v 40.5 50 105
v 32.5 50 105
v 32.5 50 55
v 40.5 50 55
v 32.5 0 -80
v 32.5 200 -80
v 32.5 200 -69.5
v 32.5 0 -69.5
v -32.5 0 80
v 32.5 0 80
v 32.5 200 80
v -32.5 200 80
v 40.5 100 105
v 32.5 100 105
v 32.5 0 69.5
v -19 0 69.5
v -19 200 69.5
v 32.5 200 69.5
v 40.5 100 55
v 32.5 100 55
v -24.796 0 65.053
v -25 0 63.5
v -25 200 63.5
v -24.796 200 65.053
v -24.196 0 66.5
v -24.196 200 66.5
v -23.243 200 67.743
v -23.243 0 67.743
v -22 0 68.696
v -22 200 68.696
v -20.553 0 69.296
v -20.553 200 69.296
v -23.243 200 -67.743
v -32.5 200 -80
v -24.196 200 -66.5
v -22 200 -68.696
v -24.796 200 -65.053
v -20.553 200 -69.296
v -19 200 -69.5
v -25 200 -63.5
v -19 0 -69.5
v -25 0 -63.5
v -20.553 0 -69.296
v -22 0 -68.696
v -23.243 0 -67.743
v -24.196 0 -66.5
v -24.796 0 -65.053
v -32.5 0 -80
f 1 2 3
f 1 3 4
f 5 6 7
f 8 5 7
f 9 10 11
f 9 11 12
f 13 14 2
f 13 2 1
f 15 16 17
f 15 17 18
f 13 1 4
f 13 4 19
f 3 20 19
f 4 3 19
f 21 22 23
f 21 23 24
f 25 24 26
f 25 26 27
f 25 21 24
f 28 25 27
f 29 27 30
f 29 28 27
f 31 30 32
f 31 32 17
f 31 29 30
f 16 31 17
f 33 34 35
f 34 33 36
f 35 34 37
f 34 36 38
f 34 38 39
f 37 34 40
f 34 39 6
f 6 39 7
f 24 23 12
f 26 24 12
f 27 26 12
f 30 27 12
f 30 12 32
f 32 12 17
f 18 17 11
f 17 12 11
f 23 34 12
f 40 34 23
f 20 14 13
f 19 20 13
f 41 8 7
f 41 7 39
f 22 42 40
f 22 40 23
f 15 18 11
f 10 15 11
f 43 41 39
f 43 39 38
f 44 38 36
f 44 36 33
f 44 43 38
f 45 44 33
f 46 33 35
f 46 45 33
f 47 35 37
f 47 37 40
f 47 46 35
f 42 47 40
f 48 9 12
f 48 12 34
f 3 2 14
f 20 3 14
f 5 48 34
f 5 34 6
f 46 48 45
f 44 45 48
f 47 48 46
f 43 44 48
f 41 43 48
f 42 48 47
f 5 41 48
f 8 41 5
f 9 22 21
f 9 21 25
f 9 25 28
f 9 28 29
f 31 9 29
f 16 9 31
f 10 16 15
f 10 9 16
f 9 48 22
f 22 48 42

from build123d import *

# Parameters (mm, degrees)
F1_DEPTH = 200
F3_W     = 8
F3_H     = 50
F4_DEPTH = 50


with BuildPart() as f1:
    # F0 (on Front) → F1 (new body)
    with BuildSketch(Plane.XZ):
        with BuildLine():
            Line((32.5, 69.5), (32.5, 80))
            Line((32.5, 80), (-32.5, 80))
            Line((-32.5, 80), (-32.5, -80))
            Line((-32.5, -80), (32.5, -80))
            Line((32.5, -80), (32.5, -69.5))
            Line((32.5, -69.5), (-19, -69.5))
            ThreePointArc((-19, -69.5), (-23.2426406871, -67.7426406871), (-25, -63.5))
            Line((-25, -63.5), (-25, 63.5))
            ThreePointArc((-25, 63.5), (-23.2426406871, 67.7426406871), (-19, 69.5))
            Line((-19, 69.5), (32.5, 69.5))
        make_face()
    extrude(amount=-F1_DEPTH)


with BuildPart() as f4:
    # F3 (on offset) → F4 (new body)
    with BuildSketch(Plane.XY.offset(105)):
        with Locations((36.5, 75)):
            Rectangle(F3_W, F3_H)
    extrude(amount=-F4_DEPTH)


solid = Compound([f1.part, f4.part])
